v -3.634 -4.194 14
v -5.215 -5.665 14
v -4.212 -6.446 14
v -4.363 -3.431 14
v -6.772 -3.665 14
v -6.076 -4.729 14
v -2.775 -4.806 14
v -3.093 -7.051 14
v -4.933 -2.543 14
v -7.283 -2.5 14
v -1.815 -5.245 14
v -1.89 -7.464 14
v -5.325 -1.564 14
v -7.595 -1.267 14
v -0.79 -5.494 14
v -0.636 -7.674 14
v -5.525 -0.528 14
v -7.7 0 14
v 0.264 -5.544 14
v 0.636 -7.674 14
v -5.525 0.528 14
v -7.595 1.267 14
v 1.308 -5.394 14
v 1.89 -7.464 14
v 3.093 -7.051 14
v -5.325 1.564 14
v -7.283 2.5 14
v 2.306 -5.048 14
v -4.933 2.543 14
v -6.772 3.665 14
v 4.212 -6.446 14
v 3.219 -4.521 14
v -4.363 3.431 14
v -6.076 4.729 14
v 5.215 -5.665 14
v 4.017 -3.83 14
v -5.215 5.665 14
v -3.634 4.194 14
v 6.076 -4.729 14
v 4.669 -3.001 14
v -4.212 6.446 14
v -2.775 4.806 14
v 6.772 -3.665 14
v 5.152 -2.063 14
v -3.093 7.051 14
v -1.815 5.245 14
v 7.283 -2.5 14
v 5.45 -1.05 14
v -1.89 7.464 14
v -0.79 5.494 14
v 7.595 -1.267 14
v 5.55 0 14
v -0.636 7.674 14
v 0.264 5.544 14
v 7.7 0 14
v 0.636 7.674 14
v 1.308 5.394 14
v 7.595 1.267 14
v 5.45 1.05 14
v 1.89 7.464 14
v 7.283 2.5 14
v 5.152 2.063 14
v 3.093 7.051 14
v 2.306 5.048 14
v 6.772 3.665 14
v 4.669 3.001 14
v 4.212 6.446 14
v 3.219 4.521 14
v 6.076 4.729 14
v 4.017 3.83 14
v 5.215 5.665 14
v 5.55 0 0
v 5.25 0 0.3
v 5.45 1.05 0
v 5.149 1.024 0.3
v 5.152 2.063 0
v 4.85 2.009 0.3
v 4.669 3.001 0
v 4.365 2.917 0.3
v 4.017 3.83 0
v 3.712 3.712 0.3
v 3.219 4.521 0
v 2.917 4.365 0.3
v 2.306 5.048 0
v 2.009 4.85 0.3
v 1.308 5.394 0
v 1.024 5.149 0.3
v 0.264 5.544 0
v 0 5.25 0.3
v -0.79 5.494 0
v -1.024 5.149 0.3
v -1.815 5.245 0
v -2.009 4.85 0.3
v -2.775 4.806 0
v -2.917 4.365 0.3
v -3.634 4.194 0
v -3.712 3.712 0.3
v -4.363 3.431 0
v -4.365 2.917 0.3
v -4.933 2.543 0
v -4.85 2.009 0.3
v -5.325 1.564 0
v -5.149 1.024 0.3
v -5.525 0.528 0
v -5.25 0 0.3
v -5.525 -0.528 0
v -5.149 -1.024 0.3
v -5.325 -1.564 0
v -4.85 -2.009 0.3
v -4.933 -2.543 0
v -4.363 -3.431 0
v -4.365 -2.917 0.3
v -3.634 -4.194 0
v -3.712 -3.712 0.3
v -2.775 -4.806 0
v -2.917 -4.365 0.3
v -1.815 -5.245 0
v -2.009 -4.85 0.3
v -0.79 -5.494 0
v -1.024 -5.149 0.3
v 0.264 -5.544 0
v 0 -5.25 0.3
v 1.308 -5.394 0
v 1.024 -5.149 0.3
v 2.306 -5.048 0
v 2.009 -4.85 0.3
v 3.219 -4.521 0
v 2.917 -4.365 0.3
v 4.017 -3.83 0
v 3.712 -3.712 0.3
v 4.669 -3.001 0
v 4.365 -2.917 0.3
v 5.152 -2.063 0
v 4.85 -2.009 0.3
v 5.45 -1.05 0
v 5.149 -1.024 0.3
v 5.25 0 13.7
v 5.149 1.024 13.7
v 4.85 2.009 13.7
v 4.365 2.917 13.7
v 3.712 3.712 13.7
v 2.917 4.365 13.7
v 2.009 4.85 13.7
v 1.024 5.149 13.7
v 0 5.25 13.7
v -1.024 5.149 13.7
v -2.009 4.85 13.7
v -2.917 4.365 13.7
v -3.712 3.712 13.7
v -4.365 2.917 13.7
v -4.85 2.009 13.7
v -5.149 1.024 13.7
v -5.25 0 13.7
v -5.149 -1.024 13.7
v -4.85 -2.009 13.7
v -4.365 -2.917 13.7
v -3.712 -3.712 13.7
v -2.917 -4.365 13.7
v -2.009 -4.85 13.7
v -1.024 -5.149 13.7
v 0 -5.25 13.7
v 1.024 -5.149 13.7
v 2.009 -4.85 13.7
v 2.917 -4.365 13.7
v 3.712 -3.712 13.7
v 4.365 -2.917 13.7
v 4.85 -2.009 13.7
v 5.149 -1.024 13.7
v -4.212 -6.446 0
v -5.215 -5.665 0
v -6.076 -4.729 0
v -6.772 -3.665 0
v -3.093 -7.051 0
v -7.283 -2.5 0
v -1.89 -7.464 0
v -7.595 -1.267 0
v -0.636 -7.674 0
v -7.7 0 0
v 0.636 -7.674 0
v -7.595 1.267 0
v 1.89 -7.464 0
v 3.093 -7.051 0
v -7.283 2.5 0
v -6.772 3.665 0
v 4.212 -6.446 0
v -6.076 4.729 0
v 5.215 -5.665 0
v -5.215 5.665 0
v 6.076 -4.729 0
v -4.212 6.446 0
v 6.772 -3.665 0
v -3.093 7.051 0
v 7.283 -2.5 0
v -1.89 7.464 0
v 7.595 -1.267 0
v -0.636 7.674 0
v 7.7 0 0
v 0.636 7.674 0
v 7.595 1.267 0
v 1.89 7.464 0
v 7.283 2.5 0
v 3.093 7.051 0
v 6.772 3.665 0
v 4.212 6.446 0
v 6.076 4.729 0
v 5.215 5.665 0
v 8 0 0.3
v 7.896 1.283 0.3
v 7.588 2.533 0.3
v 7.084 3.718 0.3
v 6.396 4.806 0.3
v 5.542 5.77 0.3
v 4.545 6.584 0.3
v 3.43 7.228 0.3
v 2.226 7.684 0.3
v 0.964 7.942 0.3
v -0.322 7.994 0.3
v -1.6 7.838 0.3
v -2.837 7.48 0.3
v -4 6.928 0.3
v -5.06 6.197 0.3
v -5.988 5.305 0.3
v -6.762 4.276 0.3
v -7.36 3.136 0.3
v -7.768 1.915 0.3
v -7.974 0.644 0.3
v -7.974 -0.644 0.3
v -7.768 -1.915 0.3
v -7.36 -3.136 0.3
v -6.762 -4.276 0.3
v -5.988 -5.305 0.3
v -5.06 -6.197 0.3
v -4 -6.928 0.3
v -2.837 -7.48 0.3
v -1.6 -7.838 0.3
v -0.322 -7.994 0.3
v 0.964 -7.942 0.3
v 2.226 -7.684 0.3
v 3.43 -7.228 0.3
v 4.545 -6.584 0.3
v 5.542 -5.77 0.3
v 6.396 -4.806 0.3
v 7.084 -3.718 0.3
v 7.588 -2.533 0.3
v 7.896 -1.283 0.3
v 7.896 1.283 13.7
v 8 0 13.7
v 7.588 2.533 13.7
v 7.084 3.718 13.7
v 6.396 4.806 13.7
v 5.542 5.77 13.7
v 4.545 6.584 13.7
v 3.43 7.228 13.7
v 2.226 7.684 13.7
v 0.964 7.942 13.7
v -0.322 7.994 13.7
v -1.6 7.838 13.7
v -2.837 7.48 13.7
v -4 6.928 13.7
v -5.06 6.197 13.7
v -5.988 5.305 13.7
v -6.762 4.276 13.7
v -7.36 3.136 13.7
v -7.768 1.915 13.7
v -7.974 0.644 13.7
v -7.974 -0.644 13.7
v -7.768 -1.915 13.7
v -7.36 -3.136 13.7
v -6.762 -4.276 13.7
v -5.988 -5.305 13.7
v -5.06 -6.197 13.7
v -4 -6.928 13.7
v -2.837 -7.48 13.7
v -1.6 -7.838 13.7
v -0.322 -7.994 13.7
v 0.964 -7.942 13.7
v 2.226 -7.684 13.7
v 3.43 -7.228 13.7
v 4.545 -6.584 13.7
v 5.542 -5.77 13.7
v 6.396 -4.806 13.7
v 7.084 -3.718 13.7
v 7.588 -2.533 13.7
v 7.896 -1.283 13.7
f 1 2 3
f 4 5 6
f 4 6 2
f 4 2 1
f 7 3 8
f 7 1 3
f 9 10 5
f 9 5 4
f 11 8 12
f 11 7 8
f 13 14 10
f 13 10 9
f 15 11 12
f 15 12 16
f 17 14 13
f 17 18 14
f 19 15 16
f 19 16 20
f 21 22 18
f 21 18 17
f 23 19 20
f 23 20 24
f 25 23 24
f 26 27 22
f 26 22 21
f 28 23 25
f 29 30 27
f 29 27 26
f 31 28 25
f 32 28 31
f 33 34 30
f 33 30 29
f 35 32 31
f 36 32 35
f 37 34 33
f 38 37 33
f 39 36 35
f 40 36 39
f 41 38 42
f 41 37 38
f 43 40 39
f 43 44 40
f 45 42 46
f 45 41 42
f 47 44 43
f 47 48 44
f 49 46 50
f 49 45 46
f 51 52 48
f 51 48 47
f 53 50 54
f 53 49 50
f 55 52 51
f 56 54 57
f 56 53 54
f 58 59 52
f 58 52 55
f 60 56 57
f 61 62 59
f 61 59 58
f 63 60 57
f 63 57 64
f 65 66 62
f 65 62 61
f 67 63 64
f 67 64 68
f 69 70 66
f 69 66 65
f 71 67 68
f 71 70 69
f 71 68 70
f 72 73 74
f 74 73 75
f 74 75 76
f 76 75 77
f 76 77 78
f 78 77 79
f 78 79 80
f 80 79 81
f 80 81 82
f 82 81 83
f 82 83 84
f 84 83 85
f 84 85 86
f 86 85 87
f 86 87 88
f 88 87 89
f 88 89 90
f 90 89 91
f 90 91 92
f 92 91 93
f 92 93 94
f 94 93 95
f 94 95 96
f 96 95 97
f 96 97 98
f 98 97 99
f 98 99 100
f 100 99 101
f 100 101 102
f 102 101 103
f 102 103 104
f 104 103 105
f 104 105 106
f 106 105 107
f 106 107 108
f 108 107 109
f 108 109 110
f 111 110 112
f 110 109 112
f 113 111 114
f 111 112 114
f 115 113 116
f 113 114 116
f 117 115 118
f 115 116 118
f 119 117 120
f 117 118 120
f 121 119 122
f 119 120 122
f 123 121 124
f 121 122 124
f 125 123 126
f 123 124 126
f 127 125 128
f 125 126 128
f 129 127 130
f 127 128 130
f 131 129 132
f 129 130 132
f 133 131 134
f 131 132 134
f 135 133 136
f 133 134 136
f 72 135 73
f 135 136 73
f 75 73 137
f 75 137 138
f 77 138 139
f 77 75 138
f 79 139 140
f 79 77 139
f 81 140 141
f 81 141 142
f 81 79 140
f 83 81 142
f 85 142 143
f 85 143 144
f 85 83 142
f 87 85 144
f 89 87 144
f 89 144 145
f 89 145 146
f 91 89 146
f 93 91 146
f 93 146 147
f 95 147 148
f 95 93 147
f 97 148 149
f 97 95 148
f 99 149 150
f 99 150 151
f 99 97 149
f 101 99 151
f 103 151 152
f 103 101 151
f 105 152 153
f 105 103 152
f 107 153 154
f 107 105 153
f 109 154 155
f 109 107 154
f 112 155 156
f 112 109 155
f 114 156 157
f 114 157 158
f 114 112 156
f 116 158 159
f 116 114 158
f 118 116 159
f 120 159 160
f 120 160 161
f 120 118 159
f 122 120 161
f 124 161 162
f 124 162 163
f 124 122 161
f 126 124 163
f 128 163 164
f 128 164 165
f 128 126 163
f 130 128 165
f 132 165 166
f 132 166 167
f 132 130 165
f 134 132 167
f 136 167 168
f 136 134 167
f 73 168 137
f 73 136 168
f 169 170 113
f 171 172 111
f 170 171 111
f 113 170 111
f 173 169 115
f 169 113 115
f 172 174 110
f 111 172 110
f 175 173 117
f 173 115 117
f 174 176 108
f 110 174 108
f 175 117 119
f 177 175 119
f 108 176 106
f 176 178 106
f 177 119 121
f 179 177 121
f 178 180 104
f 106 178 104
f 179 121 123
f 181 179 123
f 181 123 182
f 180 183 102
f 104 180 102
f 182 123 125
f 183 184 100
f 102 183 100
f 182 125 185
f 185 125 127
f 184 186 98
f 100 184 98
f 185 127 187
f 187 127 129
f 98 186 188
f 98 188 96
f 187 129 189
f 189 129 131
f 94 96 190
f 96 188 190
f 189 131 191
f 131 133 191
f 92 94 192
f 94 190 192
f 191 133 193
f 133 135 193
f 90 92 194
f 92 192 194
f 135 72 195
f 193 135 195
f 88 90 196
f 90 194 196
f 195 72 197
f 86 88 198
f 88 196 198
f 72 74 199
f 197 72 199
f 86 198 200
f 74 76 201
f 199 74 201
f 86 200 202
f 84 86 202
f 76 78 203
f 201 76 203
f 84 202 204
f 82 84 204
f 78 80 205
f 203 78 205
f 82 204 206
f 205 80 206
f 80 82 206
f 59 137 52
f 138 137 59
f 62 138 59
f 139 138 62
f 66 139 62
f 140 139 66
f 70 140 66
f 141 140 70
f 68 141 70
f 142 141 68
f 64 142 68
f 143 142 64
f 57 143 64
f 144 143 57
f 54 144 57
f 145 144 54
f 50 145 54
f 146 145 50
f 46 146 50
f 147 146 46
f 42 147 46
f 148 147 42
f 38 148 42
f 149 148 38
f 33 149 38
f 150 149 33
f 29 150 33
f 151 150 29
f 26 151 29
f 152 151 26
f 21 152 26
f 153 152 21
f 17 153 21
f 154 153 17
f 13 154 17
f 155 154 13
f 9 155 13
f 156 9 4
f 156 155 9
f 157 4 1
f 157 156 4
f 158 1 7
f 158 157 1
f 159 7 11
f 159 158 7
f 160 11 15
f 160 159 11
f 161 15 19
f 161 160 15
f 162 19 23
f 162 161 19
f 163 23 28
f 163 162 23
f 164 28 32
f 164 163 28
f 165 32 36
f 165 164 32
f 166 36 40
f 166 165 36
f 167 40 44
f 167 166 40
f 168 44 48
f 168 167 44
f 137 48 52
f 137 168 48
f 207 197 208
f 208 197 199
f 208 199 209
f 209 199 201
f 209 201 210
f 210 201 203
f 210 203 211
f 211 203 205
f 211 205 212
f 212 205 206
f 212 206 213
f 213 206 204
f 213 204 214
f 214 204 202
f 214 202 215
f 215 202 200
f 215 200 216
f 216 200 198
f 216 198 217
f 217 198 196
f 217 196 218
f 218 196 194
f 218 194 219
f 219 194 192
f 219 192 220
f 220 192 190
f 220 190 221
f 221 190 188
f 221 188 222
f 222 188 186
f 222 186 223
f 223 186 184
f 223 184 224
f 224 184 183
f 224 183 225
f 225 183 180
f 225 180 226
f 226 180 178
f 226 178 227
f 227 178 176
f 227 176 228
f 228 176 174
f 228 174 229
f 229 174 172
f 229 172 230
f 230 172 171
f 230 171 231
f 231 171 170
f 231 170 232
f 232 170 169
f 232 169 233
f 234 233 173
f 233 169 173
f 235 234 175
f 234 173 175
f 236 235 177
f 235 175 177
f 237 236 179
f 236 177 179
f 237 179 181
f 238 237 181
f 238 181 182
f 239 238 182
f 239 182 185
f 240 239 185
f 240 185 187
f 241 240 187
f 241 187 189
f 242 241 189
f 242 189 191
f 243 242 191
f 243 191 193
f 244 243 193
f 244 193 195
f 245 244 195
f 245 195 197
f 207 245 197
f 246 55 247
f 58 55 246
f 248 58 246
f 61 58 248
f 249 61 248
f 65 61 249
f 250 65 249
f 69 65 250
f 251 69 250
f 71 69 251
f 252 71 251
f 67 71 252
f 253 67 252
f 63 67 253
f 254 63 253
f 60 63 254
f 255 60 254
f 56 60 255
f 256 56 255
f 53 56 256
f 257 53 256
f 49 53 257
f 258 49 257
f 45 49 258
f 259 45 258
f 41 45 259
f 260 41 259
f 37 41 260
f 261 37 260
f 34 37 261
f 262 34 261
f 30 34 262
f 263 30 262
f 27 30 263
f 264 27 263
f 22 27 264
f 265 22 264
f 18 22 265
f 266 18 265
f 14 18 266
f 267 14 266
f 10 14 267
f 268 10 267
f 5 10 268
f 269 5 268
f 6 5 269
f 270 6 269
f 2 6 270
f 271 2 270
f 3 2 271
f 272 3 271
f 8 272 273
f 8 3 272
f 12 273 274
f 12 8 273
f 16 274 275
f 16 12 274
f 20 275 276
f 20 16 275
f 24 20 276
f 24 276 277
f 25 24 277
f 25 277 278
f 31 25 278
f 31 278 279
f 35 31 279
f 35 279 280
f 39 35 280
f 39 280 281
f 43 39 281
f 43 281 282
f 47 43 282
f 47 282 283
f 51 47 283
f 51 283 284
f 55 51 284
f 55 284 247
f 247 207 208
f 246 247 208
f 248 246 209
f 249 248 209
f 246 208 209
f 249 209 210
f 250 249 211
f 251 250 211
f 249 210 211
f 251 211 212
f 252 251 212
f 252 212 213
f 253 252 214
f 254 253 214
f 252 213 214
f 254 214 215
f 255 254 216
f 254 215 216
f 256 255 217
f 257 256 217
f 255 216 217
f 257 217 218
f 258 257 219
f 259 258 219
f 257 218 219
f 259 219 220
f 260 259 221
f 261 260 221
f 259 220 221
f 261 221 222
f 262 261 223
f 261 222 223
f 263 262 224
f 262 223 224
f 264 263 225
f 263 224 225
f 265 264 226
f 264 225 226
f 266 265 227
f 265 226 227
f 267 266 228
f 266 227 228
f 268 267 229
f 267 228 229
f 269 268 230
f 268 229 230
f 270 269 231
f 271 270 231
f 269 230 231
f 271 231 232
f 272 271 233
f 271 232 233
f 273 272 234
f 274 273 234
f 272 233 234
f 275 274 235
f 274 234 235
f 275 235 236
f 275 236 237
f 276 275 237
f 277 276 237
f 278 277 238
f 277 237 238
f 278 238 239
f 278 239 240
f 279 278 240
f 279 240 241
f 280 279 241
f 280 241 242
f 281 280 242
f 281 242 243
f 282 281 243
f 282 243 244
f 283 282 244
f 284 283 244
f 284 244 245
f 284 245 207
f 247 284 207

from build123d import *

# Parameters (mm, degrees)
SKETCH1_R           = 8
BOSS_EXTRUDE1_DEPTH = 14
SKETCH2_R           = 5.25
CUT_EXTRUDE1_DEPTH  = 14
CHAMFER7_SIZE       = 0.3


with BuildPart() as part:
    # Sketch1 → Boss-Extrude1 (new body)
    with BuildSketch(Plane.XY):
        Circle(SKETCH1_R)
    extrude(amount=BOSS_EXTRUDE1_DEPTH)

    # Sketch2 → Cut-Extrude1 (cut)
    with BuildSketch(Plane.XY):
        Circle(SKETCH2_R)
    extrude(amount=CUT_EXTRUDE1_DEPTH, mode=Mode.SUBTRACT)

    # Chamfer7
    chamfer7_edges = [part.edges().sort_by_distance(p)[0] for p in [
        (-8, 0, 0),
        (-8, 0, 14),
        (-5.25, 0, 0),
        (-5.25, 0, 14),
    ]]
    chamfer(chamfer7_edges, length=CHAMFER7_SIZE)


solid = part.part
